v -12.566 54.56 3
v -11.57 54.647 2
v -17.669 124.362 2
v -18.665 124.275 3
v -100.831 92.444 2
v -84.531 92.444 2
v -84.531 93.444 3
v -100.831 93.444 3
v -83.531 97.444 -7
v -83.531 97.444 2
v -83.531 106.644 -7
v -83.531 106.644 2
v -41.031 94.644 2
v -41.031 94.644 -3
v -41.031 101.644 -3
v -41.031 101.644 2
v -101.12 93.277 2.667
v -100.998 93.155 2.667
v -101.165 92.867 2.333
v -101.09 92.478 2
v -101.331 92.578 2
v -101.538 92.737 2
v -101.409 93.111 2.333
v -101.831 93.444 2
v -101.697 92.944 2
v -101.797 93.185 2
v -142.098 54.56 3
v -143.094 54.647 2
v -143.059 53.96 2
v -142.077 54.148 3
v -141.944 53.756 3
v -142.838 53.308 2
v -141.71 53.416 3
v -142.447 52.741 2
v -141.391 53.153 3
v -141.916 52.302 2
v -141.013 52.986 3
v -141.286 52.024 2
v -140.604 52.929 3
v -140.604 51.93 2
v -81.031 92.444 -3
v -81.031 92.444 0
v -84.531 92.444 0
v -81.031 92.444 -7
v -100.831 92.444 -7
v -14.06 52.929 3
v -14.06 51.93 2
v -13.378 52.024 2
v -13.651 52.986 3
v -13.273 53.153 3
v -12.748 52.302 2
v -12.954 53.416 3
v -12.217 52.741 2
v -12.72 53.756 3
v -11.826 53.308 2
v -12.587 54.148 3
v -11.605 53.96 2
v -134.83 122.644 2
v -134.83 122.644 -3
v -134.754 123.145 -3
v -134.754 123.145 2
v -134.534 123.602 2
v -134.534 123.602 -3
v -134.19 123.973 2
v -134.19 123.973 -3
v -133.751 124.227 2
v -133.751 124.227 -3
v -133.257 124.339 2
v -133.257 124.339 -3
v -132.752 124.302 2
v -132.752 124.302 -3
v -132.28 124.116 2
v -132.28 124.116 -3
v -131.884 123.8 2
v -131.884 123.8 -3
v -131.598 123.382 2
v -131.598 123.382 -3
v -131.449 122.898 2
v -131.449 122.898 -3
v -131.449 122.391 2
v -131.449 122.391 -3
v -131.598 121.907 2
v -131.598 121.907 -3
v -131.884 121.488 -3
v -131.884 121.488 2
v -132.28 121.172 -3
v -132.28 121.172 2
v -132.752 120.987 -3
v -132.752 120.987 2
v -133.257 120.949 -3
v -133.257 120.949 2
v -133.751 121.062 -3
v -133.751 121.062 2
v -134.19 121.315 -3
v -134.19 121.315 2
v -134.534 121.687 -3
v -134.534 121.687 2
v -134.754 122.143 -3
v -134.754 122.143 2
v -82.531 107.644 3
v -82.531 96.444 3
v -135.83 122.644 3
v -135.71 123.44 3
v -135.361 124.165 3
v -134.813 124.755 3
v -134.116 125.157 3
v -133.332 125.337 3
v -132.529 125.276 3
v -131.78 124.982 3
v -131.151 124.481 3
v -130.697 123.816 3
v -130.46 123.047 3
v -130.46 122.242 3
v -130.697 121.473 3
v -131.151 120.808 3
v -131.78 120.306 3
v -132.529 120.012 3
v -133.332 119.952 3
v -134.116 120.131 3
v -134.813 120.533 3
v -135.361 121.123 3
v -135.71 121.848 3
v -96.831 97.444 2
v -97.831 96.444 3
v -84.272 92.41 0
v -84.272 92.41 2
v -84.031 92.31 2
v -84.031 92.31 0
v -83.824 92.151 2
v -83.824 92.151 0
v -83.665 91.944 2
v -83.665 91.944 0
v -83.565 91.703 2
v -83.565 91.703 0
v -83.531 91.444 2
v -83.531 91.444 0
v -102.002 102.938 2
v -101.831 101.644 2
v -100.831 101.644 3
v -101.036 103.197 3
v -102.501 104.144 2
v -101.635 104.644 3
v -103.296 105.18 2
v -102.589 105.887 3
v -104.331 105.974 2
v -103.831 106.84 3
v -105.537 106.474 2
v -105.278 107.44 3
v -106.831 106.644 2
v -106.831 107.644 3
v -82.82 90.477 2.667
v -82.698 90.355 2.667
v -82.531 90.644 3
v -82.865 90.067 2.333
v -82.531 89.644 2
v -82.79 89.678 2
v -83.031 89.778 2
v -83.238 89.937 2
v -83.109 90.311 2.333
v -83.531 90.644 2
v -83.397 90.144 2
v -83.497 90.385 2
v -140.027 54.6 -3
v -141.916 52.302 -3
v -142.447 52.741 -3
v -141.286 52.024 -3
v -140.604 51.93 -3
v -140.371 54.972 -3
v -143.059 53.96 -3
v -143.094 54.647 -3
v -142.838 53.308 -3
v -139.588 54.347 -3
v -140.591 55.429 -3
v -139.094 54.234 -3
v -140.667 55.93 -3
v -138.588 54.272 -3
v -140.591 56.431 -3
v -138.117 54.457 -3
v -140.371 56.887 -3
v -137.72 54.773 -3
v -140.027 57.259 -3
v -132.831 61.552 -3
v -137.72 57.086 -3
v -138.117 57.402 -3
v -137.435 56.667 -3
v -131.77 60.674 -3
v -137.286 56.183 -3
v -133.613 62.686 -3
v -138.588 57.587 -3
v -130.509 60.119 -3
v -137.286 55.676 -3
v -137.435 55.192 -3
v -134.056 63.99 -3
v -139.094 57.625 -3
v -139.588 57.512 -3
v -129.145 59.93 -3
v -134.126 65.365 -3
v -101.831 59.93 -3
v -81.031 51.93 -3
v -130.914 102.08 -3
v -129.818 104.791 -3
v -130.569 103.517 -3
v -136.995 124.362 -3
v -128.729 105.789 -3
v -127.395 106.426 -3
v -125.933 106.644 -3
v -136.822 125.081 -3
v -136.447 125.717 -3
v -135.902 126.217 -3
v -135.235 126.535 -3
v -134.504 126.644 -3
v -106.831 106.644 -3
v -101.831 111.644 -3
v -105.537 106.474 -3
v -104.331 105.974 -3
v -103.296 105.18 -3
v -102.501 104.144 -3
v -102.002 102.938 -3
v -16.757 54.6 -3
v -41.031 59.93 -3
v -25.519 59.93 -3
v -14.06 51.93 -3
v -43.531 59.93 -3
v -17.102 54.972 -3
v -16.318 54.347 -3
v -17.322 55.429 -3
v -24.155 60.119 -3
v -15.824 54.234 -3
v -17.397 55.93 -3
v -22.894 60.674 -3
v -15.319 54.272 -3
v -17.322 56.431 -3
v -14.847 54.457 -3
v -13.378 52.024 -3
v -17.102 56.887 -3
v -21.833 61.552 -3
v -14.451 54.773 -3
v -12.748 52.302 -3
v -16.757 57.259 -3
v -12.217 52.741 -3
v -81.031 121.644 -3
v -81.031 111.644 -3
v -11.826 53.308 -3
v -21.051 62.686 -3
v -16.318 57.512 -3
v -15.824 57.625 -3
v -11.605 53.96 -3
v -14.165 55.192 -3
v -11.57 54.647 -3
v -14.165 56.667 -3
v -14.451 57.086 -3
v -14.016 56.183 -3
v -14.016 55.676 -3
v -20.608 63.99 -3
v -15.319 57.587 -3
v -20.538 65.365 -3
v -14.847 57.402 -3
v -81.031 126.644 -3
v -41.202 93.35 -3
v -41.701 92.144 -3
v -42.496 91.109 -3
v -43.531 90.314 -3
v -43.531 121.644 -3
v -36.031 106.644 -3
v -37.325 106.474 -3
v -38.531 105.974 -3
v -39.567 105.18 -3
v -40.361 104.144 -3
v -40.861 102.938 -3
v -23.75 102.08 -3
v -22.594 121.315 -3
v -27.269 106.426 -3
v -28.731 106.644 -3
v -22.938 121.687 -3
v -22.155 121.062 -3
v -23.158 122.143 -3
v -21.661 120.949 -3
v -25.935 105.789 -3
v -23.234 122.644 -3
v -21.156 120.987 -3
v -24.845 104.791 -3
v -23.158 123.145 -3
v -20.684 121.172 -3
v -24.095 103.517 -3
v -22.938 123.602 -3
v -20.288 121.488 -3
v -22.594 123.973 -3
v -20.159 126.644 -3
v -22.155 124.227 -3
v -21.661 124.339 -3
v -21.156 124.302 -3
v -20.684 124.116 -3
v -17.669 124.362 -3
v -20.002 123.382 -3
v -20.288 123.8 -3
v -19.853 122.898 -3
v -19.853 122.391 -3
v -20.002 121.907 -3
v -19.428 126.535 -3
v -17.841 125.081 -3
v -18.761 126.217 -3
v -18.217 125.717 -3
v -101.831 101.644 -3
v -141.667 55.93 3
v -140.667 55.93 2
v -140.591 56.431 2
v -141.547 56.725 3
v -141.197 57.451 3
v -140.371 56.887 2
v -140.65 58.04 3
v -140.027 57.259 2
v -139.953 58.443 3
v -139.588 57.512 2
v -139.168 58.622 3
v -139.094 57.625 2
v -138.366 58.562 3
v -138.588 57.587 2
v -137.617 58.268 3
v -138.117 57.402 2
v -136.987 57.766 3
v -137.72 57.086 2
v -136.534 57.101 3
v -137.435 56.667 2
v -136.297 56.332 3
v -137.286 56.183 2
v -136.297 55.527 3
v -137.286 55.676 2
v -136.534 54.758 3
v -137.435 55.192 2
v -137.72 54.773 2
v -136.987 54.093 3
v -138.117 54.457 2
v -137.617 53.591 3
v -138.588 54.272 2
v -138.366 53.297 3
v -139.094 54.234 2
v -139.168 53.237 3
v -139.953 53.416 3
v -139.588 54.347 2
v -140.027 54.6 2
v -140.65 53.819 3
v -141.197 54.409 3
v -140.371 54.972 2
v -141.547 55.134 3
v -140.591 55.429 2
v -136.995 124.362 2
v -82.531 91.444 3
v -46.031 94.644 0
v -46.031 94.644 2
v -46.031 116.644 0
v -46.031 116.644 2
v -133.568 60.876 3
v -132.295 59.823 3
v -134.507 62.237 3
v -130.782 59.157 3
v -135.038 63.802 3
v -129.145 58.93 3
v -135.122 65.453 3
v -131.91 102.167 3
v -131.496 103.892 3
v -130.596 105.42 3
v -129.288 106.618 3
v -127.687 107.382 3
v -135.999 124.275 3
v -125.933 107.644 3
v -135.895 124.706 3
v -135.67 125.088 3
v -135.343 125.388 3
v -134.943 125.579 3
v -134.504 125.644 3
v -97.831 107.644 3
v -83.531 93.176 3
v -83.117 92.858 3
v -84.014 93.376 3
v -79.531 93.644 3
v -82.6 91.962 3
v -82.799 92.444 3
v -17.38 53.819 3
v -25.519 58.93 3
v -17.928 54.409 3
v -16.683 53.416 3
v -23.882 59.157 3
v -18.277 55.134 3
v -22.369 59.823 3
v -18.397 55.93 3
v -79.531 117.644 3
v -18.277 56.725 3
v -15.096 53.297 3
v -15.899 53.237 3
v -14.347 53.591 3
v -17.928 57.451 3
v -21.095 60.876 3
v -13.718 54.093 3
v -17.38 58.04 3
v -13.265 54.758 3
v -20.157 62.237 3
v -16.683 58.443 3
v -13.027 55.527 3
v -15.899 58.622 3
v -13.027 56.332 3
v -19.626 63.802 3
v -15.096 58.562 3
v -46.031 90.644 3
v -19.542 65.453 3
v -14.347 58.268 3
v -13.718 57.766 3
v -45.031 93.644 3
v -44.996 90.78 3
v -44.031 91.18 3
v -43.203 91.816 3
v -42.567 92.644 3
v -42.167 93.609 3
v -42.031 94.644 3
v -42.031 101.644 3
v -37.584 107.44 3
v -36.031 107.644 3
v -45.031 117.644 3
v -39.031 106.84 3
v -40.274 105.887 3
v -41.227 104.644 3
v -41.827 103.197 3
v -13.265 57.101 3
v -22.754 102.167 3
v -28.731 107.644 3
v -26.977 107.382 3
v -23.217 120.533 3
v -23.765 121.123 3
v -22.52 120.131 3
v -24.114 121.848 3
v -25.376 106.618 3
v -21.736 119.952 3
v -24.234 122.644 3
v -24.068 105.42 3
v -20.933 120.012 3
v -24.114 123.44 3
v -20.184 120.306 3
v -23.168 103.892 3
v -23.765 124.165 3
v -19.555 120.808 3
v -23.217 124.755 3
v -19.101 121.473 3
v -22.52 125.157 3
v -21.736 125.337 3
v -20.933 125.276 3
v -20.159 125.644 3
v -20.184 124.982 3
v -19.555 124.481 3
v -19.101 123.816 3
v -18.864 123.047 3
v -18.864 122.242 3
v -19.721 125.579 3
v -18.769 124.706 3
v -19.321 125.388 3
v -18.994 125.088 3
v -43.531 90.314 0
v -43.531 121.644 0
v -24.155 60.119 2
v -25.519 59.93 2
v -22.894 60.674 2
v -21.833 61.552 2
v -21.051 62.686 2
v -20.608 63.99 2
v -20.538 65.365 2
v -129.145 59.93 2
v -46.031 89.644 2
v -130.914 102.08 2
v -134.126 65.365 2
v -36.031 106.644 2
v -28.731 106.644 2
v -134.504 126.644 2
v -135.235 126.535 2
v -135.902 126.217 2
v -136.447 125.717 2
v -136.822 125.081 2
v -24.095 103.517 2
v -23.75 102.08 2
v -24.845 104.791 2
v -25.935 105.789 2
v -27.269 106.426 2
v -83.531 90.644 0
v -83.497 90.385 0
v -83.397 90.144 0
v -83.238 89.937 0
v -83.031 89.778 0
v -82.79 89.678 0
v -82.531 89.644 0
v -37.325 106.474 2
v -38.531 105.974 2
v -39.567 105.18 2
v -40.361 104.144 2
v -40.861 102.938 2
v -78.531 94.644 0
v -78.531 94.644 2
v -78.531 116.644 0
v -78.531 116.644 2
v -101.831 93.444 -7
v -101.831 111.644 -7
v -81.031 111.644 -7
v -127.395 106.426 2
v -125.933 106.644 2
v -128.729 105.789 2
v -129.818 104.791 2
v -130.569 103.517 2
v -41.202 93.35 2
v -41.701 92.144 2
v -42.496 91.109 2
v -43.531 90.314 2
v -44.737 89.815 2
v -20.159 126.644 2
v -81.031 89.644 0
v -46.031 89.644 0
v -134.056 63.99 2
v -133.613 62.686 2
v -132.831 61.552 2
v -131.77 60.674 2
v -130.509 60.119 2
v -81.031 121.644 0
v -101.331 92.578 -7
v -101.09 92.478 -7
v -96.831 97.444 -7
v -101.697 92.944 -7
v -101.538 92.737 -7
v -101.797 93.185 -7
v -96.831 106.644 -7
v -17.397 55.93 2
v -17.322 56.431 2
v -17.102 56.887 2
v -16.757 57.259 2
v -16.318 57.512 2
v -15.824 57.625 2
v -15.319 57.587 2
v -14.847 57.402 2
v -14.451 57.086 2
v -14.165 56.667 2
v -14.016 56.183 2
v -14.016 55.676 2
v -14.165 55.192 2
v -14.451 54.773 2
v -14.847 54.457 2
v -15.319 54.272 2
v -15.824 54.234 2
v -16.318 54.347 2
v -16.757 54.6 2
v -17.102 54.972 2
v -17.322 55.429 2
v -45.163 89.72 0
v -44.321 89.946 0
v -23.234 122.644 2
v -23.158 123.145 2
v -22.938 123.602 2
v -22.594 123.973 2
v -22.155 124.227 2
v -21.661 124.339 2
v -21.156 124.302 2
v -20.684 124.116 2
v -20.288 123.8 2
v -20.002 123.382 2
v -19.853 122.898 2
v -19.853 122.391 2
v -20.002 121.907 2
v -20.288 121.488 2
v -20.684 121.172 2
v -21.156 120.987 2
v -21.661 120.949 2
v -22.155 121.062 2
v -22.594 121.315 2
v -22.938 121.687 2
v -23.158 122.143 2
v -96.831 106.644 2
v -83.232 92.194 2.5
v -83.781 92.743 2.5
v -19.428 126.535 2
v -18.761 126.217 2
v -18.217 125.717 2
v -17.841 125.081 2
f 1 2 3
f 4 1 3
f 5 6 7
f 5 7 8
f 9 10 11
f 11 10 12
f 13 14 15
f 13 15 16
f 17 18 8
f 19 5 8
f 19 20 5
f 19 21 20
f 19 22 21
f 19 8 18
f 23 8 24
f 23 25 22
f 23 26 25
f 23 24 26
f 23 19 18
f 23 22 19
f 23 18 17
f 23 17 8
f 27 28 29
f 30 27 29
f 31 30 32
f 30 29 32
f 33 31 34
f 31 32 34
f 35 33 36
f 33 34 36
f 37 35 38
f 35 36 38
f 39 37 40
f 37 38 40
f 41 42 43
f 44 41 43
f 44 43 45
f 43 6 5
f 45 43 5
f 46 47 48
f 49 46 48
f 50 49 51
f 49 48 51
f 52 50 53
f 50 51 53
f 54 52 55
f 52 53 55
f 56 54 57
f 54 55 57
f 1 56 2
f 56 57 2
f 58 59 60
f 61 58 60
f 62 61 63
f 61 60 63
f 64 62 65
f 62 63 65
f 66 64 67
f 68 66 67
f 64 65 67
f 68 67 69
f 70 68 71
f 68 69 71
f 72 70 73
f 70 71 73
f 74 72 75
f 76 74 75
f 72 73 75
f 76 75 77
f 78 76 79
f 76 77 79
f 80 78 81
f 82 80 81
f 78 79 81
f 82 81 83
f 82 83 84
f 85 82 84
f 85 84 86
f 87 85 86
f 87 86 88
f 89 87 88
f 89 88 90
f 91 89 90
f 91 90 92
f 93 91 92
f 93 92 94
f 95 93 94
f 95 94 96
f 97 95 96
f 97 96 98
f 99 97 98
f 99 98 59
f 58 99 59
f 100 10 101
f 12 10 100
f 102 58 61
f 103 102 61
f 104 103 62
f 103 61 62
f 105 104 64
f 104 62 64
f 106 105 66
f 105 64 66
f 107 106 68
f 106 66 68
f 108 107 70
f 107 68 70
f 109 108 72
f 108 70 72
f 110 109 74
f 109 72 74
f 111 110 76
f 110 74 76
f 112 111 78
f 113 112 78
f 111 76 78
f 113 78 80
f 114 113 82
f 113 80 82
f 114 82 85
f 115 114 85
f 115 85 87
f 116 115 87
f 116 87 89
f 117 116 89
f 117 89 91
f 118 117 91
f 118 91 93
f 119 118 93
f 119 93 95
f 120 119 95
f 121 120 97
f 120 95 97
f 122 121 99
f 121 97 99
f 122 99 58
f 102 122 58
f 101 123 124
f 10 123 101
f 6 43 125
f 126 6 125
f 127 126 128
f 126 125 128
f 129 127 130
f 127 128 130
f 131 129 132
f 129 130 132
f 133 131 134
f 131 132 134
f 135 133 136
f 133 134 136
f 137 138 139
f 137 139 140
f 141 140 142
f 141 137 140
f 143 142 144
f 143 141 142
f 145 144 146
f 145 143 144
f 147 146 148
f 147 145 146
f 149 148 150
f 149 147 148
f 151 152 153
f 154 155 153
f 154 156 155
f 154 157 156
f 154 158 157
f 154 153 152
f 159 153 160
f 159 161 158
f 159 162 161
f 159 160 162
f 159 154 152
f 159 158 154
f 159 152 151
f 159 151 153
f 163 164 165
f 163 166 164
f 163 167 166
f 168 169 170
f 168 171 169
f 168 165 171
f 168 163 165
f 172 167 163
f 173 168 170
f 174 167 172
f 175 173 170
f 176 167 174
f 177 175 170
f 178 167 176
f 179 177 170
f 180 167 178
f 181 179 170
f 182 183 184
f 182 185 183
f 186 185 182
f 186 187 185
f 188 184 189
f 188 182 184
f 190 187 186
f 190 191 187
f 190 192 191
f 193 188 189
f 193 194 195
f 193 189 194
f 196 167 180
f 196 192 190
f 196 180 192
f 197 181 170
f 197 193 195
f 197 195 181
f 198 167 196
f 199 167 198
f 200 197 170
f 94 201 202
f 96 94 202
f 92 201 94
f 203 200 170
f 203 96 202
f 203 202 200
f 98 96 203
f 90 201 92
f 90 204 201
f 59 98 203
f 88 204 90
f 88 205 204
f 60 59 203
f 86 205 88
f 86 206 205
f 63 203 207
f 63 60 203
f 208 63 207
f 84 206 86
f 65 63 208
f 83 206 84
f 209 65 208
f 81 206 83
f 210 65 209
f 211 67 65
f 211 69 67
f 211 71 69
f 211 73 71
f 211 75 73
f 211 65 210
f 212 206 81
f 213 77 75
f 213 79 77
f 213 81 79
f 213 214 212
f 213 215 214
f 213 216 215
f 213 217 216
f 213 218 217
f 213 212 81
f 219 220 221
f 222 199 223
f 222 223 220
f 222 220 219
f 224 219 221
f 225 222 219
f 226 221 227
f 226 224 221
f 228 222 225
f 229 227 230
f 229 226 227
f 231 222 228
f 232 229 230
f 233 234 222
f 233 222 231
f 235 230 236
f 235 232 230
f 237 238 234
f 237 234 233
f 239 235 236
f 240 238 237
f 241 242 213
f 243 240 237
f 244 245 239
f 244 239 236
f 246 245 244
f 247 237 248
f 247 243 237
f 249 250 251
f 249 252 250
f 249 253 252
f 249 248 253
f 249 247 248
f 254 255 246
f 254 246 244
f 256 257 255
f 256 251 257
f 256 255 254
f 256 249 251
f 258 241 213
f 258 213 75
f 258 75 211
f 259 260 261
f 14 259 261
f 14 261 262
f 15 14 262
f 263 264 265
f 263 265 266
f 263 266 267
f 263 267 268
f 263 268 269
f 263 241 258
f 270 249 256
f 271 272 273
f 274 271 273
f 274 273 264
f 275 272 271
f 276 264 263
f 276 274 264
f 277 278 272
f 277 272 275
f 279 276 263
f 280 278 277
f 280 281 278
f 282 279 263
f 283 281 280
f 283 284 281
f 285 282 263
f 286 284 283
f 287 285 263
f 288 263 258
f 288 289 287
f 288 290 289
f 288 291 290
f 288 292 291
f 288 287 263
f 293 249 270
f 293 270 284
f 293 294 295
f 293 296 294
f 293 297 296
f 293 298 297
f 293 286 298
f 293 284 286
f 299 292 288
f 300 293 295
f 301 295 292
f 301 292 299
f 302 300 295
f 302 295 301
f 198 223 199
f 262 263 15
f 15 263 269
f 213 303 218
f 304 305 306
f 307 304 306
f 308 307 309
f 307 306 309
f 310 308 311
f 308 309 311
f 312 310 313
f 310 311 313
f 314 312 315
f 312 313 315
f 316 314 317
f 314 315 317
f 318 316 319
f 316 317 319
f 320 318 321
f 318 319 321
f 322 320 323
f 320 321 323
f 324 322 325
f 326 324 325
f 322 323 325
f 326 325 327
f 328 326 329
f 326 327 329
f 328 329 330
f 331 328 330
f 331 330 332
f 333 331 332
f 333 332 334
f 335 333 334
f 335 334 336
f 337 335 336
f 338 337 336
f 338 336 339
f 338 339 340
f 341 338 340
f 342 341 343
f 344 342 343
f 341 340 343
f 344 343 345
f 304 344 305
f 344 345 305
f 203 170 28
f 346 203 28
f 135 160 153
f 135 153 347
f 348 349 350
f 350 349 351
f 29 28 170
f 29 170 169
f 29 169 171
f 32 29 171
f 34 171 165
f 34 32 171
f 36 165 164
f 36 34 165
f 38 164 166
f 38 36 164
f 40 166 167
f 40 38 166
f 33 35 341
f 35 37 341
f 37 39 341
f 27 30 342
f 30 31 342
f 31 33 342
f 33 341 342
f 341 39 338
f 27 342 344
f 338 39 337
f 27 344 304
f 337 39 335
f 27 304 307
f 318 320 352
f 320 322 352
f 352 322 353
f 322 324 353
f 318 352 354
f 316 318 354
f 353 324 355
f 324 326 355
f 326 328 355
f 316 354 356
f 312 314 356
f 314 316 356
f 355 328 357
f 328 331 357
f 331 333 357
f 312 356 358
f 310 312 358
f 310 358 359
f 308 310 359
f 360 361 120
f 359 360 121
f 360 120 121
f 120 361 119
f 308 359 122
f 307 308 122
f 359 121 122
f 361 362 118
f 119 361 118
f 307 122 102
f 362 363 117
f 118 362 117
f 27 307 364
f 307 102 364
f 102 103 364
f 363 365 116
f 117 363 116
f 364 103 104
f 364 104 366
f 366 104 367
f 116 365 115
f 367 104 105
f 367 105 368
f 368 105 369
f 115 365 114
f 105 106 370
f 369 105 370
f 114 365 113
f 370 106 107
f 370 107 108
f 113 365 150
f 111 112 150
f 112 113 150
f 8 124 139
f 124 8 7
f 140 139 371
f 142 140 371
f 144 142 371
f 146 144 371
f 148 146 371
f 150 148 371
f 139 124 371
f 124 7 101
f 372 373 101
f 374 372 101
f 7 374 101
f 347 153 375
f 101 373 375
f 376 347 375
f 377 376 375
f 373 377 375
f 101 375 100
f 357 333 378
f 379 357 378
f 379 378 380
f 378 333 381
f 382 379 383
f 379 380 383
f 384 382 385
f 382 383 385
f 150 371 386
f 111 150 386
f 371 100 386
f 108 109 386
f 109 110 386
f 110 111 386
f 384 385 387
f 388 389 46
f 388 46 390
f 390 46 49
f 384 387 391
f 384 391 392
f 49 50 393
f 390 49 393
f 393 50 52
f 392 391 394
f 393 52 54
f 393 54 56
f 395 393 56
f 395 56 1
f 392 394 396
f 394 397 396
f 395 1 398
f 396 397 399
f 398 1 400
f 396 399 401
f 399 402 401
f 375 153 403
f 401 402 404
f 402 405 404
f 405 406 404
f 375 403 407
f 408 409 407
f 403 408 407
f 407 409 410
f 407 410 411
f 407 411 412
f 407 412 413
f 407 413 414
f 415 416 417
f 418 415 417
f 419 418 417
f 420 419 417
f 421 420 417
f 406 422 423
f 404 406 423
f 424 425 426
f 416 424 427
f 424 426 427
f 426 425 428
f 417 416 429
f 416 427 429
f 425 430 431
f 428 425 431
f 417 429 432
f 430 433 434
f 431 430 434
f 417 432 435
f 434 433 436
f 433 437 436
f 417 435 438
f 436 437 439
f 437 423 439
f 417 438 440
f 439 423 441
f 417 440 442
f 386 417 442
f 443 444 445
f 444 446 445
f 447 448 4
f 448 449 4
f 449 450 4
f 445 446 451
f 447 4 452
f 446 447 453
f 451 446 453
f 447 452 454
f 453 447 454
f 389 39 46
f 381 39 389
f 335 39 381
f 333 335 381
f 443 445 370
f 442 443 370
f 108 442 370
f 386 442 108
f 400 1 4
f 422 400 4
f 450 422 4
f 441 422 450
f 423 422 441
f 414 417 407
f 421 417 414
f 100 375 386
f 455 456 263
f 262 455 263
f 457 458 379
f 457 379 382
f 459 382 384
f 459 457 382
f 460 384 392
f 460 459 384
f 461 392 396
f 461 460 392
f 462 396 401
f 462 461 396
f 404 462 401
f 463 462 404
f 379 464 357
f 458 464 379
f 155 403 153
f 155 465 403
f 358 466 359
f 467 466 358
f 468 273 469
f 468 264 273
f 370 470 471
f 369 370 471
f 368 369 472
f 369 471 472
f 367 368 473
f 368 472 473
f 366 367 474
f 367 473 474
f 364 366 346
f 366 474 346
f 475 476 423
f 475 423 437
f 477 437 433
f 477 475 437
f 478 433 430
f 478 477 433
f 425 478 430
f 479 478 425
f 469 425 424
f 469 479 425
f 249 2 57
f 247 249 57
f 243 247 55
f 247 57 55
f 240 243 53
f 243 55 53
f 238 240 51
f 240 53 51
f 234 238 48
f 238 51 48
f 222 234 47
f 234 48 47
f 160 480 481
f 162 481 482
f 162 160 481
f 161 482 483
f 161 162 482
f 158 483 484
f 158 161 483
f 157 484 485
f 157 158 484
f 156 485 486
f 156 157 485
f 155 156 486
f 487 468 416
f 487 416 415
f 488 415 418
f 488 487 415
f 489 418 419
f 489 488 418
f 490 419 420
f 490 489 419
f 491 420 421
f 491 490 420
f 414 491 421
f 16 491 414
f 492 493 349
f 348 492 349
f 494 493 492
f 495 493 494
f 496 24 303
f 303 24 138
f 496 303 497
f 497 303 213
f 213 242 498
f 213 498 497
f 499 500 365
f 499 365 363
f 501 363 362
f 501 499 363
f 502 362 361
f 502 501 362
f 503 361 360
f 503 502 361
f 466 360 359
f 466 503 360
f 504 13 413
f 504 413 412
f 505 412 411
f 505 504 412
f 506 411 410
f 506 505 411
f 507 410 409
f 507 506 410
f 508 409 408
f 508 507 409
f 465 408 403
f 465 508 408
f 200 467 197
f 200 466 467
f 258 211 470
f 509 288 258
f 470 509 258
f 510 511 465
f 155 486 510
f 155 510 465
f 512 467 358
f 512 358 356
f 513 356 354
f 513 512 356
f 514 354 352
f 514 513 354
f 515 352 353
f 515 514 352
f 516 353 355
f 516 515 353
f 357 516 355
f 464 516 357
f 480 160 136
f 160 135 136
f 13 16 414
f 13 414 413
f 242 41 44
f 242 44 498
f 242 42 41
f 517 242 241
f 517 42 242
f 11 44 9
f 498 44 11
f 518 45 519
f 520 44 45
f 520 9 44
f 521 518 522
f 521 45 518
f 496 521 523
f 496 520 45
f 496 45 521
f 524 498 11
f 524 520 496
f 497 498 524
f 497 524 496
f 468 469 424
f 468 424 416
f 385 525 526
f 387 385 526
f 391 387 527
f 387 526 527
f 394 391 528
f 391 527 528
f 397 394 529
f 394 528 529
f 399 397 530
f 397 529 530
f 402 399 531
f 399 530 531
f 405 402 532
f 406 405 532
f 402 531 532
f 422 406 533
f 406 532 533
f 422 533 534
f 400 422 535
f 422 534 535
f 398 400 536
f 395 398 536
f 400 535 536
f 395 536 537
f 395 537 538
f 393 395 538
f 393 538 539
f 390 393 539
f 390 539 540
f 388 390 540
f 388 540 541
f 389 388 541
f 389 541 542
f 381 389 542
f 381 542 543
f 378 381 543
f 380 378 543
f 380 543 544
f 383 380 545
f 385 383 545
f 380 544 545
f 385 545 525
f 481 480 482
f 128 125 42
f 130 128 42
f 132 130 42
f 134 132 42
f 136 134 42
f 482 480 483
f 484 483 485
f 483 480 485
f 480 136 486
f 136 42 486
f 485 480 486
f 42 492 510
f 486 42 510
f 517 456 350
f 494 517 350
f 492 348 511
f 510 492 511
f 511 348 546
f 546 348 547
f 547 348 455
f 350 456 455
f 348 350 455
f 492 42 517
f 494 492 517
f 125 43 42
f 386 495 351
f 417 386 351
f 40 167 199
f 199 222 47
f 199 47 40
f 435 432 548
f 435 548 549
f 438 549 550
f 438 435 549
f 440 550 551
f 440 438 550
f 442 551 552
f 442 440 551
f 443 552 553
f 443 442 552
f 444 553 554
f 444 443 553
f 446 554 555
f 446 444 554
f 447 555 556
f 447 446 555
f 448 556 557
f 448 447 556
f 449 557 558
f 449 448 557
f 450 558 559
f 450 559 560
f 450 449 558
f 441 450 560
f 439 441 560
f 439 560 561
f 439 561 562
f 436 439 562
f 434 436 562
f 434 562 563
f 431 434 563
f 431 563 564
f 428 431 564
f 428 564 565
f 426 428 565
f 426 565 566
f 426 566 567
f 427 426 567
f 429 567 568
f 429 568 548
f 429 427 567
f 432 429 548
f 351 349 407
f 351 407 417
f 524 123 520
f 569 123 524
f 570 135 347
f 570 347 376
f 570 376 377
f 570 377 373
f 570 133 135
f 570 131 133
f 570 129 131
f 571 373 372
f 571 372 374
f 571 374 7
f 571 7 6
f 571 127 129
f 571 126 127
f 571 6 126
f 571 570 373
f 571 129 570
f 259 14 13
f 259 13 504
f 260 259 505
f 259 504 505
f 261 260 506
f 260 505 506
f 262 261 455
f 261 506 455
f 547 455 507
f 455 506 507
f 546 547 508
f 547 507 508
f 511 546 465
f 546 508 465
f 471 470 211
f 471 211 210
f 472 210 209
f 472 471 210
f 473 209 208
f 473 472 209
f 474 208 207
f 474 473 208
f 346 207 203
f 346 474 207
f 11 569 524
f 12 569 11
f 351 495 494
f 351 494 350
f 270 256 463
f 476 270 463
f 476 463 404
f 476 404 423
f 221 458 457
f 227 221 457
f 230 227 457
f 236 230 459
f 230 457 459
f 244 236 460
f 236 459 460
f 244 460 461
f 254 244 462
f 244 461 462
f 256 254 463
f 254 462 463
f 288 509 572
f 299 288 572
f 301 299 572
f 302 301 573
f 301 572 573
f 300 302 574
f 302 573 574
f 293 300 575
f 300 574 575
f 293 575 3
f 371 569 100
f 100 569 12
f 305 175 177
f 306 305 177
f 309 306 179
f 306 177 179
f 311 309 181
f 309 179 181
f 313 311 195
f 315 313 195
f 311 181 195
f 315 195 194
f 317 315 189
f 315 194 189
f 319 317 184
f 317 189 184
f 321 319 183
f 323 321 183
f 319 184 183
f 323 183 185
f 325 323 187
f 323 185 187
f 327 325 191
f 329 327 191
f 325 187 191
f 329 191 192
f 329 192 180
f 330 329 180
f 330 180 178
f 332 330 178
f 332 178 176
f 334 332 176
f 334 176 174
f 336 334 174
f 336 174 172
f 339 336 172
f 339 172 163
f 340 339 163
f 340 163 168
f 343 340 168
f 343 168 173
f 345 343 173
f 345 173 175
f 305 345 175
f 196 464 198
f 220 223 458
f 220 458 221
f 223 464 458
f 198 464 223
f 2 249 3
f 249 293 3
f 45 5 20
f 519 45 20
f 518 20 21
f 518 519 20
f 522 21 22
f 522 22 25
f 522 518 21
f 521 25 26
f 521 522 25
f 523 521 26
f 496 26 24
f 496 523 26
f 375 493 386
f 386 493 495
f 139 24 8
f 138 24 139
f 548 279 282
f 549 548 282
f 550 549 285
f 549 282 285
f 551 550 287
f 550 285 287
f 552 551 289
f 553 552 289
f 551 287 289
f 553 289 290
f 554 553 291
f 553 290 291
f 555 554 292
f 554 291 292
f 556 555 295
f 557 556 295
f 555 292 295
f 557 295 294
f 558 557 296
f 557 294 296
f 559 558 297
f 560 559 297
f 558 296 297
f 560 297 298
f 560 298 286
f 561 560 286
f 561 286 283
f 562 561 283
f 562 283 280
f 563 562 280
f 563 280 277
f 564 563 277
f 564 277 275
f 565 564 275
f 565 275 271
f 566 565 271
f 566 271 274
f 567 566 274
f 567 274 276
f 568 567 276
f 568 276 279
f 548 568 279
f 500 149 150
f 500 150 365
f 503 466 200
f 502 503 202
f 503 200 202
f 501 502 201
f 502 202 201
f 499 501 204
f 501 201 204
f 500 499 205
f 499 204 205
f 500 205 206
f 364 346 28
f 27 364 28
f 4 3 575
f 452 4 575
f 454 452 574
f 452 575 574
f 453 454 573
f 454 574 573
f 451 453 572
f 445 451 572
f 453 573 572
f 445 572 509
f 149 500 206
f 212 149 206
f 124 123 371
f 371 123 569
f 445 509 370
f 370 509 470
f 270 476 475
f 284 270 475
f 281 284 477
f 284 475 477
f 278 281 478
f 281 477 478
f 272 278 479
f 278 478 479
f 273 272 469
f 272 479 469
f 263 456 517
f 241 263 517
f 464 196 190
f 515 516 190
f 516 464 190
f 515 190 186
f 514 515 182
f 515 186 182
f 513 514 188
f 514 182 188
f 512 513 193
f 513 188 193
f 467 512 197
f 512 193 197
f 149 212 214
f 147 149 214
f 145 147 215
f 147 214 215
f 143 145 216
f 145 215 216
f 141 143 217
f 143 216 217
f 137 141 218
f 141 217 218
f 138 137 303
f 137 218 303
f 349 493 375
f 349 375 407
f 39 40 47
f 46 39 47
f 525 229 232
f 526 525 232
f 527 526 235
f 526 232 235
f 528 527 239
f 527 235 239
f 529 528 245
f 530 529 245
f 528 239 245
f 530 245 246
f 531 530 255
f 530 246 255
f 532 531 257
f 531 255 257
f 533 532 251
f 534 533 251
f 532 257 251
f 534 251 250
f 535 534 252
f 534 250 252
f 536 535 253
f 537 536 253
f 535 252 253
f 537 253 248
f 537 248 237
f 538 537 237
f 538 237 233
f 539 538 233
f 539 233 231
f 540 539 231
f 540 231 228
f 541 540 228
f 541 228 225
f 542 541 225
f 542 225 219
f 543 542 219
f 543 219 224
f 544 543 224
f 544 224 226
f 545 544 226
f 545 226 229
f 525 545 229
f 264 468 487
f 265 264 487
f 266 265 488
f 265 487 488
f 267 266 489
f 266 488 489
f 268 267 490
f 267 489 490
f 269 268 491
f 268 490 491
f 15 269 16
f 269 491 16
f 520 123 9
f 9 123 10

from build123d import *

# Parameters (mm, degrees)
SKETCH1_W                 = 37.50000004
SKETCH1_H                 = 31.999999963
BOSS_EXTRUDE1_DEPTH       = 3
SKETCH2_W                 = 6
SKETCH2_H                 = 61.71460232
BOSS_EXTRUDE2_DEPTH       = 25.662738028
SKETCH3_W                 = 63.162738068
SKETCH3_H                 = 6
BOSS_EXTRUDE3_DEPTH       = 5.000000037
SKETCH4_W                 = 63.162738068
SKETCH4_H                 = 6
BOSS_EXTRUDE4_DEPTH       = 8
SKETCH5_W                 = 6
SKETCH5_H                 = 74.714602357
BOSS_EXTRUDE5_DEPTH       = 55.76390052
CUT_EXTRUDE1_DEPTH        = 2.499999998
SKETCH7_W                 = 6
SKETCH7_H                 = 32.514602357
CUT_EXTRUDE2_DEPTH        = 18.3
SKETCH8_W                 = 6
SKETCH8_H                 = 29.714602357
CUT_EXTRUDE3_DEPTH        = 2.5
SKETCH9_W                 = 6
SKETCH9_H                 = 46.714602358
CUT_EXTRUDE4_DEPTH        = 20.968950764
SKETCH10_W                = 6
SKETCH10_H                = 46.714602357
CUT_EXTRUDE5_DEPTH        = 32.770113219
SKETCH11_W                = 20.8
SKETCH11_H                = 19.200000012
BOSS_EXTRUDE6_DEPTH       = 4
SKETCH12_W                = 32.5
SKETCH12_H                = 22
CUT_EXTRUDE6_DEPTH        = 187.686043948
SKETCH13_W                = 13.3
SKETCH13_H                = 9.2
CUT_EXTRUDE7_DEPTH        = 187.686043948
DRAFT1_ANGLE              = -5
DRAFT2_ANGLE              = 5
F_4_CLEARANCE_HOLE1_D     = 3.4
F_4_CLEARANCE_HOLE1_DEPTH = 10
FILLET1_R                 = 1
FILLET2_R                 = 2.5
FILLET3_R                 = 5
CHAMFER1_SIZE             = 1


with BuildPart() as part:
    # Sketch1 → Boss-Extrude1 (new body)
    with BuildSketch(Plane.XY.offset(3)):
        with Locations((-62.281298008, 105.644197082)):
            Rectangle(SKETCH1_W, SKETCH1_H)
    extrude(amount=-BOSS_EXTRUDE1_DEPTH)

    # Sketch2 → Boss-Extrude2 (add)
    with BuildSketch(Plane(origin=(-43.531297988, 0, 0), x_dir=(0, 0, -1), z_dir=(1, 0, 0))):
        with Locations((0, 90.786895904)):
            Rectangle(SKETCH2_W, SKETCH2_H)
    extrude(amount=BOSS_EXTRUDE2_DEPTH)

    # Sketch3 → Boss-Extrude3 (add)
    with BuildSketch(Plane(origin=(0, 121.644197064, 0), x_dir=(-1, 0, 0), z_dir=(0, 1, 0))):
        with Locations((49.449928994, 0)):
            Rectangle(SKETCH3_W, SKETCH3_H)
    extrude(amount=BOSS_EXTRUDE3_DEPTH)

    # Sketch4 → Boss-Extrude4 (add)
    with BuildSketch(Plane.XZ.offset(-59.929594744)):
        with Locations((-49.449928994, 0)):
            Rectangle(SKETCH4_W, SKETCH4_H)
    extrude(amount=BOSS_EXTRUDE4_DEPTH)

    # Sketch5 → Boss-Extrude5 (add)
    with BuildSketch(Plane.ZY.offset(81.031298028)):
        with Locations((0, 89.286895923)):
            Rectangle(SKETCH5_W, SKETCH5_H)
    extrude(amount=BOSS_EXTRUDE5_DEPTH)

    # Sketch6 → Cut-Extrude1 (cut)
    with BuildSketch(Plane(origin=(-81.031298028, 0, 0), x_dir=(0, 0, -1), z_dir=(1, 0, 0))):
        Polygon((0, 89.644197101), (-3, 89.644197101), (-3, 59.929594744), (3, 59.929594744), (3, 92.444197101), (0, 92.444197101), align=None)
    extrude(amount=-CUT_EXTRUDE1_DEPTH, mode=Mode.SUBTRACT)

    # Sketch7 → Cut-Extrude2 (cut)
    with BuildSketch(Plane(origin=(-83.531298026, 0, 0), x_dir=(0, 0, -1), z_dir=(1, 0, 0))):
        with Locations((0, 76.186895922)):
            Rectangle(SKETCH7_W, SKETCH7_H)
    extrude(amount=-CUT_EXTRUDE2_DEPTH, mode=Mode.SUBTRACT)

    # Sketch8 → Cut-Extrude3 (cut)
    with BuildSketch(Plane.ZY.offset(43.531297988)):
        with Locations((0, 74.786895923)):
            Rectangle(SKETCH8_W, SKETCH8_H)
    extrude(amount=-CUT_EXTRUDE3_DEPTH, mode=Mode.SUBTRACT)

    # Sketch9 → Cut-Extrude4 (cut)
    with BuildSketch(Plane.ZY.offset(41.031297988)):
        with Locations((-1.31e-07, 83.286895949)):
            Rectangle(SKETCH9_W, SKETCH9_H)
    extrude(amount=-CUT_EXTRUDE4_DEPTH, mode=Mode.SUBTRACT)

    # Sketch10 → Cut-Extrude5 (cut)
    with BuildSketch(Plane(origin=(-101.831298026, 0, 0), x_dir=(0, 0, -1), z_dir=(1, 0, 0))):
        with Locations((0, 83.286895923)):
            Rectangle(SKETCH10_W, SKETCH10_H)
    extrude(amount=-CUT_EXTRUDE5_DEPTH, mode=Mode.SUBTRACT)

    # Sketch11 → Boss-Extrude6 (add)
    with BuildSketch(Plane(origin=(0, 0, -3), x_dir=(-1, 0, 0), z_dir=(0, 0, -1))):
        with Locations((91.431298026, 102.044197107)):
            Rectangle(SKETCH11_W, SKETCH11_H)
    extrude(amount=BOSS_EXTRUDE6_DEPTH)

    # Sketch12 → Cut-Extrude6 (cut, through all)
    with BuildSketch(Plane.XY.offset(3)):
        with Locations((-62.281298026, 105.644197101)):
            Rectangle(SKETCH12_W, SKETCH12_H)
    extrude(amount=-CUT_EXTRUDE6_DEPTH, mode=Mode.SUBTRACT)

    # Sketch13 → Cut-Extrude7 (cut, through all)
    with BuildSketch(Plane.XY.offset(3)):
        with Locations((-90.181298026, 102.044197101)):
            Rectangle(SKETCH13_W, SKETCH13_H)
    extrude(amount=-CUT_EXTRUDE7_DEPTH, mode=Mode.SUBTRACT)

    # Draft1
    draft1_faces = [part.faces().sort_by_distance(p)[0] for p in [
        (-20.062347224, 83.286895949, -1.31e-07),
        (-134.601411245, 83.286895923, 0),
    ]]
    draft(draft1_faces, Plane(origin=(0, 59.929594744, 0), x_dir=(1, 0, 0), z_dir=(0, 1, 0)), DRAFT1_ANGLE)

    # Draft2
    draft2_faces = [part.faces().sort_by_distance(p)[0] for p in [
        (-136.795198548, 89.286895923, 0),
        (-17.86855996, 89.286895923, 0),
    ]]
    draft(draft2_faces, Plane.ZX.offset(126.644197101), DRAFT2_ANGLE)

    # #4 Clearance Hole1
    with Locations(Plane.XY.offset(3)):
        with Locations((-21.533884656, 122.644197101), (-133.129873852, 122.644197101), (-138.966645249, 55.929594744), (-15.697113258, 55.929594744)):
            Hole(F_4_CLEARANCE_HOLE1_D / 2, depth=F_4_CLEARANCE_HOLE1_DEPTH)

    # Fillet1
    fillet1_edges = [part.edges().sort_by_distance(p)[0] for p in [
        (-83.531298026, 89.644197101, 1.5),
        (-101.831298026, 92.444197101, -2),
        (-83.531298026, 92.444197101, 1.5),
    ]]
    fillet(fillet1_edges, radius=FILLET1_R)

    # Fillet2
    fillet2_edges = [part.edges().sort_by_distance(p)[0] for p in [
        (-17.86855996, 126.644197101, 0),
        (-11.331879254, 51.929594744, 0),
        (-136.795198548, 126.644197101, 0),
        (-143.331879255, 51.929594744, 0),
    ]]
    fillet(fillet2_edges, radius=FILLET2_R)

    # Fillet3
    fillet3_edges = [part.edges().sort_by_distance(p)[0] for p in [
        (-101.831298026, 106.644197101, 0),
        (-41.031297988, 106.644197128, -1.31e-07),
        (-41.031297988, 89.644197101, 0),
        (-20.062347226, 59.92959477, 0),
        (-24.149345354, 106.644197128, 0),
        (-130.514413118, 106.644197101, 0),
        (-134.601411243, 59.92959477, 0),
    ]]
    fillet(fillet3_edges, radius=FILLET3_R)

    # Chamfer1
    chamfer1_edges = [part.edges().sort_by_distance(p)[0] for p in [
        (-46.031298026, 105.644197101, 3),
        (-62.281298026, 116.644197101, 3),
        (-78.531298026, 105.644197101, 3),
        (-62.281298026, 94.644197101, 3),
        (-90.181298026, 106.644197101, 3),
        (-96.831298026, 102.044197101, 3),
        (-90.181298026, 97.444197101, 3),
        (-83.531298026, 102.044197101, 3),
        (-13.997113258, 55.929594744, 3),
        (-137.266645249, 55.929594744, 3),
        (-131.429873852, 122.644197101, 3),
        (-19.833884656, 122.644197101, 3),
        (-92.681298026, 92.444197101, 3),
        (-83.531298026, 91.044197101, 3),
        (-64.281298007, 89.644197101, 3),
        (-101.538404807, 92.73709032, 3),
        (-83.238404807, 89.93709032, 3),
        (-83.824191245, 92.151303882, 3),
        (-77.331879254, 51.929594744, 3),
        (-77.331879254, 126.644197101, 3),
        (-140.044476053, 89.504785279, 3),
        (-14.619282455, 89.504785279, 3),
        (-136.193346132, 125.987390443, 3),
        (-18.470412376, 125.987390443, 3),
        (-142.446801344, 52.740619225, 3),
        (-12.216957164, 52.740619225, 3),
        (-116.382027637, 106.644197101, 3),
        (-101.831298026, 97.544197101, 3),
        (-32.381149606, 106.644197128, 2.999999869),
        (-41.031297988, 98.144197115, 2.999999869),
        (-22.143971987, 83.722674663, 3),
        (-61.031298008, 59.929594744, 3),
        (-132.519786483, 83.722674649, 3),
        (-42.495764082, 91.108663195, 3),
        (-103.29576412, 105.179731007, 3),
        (-39.566831894, 105.179731034, 3),
        (-21.832503047, 61.551643732, 3),
        (-25.353050186, 105.330583812, 3),
        (-129.310708286, 105.330583785, 3),
        (-132.831255421, 61.551643732, 3),
    ]]
    chamfer(chamfer1_edges, length=CHAMFER1_SIZE - 0.0001)  # a hair under: the kernel refuses the full size


solid = part.part
